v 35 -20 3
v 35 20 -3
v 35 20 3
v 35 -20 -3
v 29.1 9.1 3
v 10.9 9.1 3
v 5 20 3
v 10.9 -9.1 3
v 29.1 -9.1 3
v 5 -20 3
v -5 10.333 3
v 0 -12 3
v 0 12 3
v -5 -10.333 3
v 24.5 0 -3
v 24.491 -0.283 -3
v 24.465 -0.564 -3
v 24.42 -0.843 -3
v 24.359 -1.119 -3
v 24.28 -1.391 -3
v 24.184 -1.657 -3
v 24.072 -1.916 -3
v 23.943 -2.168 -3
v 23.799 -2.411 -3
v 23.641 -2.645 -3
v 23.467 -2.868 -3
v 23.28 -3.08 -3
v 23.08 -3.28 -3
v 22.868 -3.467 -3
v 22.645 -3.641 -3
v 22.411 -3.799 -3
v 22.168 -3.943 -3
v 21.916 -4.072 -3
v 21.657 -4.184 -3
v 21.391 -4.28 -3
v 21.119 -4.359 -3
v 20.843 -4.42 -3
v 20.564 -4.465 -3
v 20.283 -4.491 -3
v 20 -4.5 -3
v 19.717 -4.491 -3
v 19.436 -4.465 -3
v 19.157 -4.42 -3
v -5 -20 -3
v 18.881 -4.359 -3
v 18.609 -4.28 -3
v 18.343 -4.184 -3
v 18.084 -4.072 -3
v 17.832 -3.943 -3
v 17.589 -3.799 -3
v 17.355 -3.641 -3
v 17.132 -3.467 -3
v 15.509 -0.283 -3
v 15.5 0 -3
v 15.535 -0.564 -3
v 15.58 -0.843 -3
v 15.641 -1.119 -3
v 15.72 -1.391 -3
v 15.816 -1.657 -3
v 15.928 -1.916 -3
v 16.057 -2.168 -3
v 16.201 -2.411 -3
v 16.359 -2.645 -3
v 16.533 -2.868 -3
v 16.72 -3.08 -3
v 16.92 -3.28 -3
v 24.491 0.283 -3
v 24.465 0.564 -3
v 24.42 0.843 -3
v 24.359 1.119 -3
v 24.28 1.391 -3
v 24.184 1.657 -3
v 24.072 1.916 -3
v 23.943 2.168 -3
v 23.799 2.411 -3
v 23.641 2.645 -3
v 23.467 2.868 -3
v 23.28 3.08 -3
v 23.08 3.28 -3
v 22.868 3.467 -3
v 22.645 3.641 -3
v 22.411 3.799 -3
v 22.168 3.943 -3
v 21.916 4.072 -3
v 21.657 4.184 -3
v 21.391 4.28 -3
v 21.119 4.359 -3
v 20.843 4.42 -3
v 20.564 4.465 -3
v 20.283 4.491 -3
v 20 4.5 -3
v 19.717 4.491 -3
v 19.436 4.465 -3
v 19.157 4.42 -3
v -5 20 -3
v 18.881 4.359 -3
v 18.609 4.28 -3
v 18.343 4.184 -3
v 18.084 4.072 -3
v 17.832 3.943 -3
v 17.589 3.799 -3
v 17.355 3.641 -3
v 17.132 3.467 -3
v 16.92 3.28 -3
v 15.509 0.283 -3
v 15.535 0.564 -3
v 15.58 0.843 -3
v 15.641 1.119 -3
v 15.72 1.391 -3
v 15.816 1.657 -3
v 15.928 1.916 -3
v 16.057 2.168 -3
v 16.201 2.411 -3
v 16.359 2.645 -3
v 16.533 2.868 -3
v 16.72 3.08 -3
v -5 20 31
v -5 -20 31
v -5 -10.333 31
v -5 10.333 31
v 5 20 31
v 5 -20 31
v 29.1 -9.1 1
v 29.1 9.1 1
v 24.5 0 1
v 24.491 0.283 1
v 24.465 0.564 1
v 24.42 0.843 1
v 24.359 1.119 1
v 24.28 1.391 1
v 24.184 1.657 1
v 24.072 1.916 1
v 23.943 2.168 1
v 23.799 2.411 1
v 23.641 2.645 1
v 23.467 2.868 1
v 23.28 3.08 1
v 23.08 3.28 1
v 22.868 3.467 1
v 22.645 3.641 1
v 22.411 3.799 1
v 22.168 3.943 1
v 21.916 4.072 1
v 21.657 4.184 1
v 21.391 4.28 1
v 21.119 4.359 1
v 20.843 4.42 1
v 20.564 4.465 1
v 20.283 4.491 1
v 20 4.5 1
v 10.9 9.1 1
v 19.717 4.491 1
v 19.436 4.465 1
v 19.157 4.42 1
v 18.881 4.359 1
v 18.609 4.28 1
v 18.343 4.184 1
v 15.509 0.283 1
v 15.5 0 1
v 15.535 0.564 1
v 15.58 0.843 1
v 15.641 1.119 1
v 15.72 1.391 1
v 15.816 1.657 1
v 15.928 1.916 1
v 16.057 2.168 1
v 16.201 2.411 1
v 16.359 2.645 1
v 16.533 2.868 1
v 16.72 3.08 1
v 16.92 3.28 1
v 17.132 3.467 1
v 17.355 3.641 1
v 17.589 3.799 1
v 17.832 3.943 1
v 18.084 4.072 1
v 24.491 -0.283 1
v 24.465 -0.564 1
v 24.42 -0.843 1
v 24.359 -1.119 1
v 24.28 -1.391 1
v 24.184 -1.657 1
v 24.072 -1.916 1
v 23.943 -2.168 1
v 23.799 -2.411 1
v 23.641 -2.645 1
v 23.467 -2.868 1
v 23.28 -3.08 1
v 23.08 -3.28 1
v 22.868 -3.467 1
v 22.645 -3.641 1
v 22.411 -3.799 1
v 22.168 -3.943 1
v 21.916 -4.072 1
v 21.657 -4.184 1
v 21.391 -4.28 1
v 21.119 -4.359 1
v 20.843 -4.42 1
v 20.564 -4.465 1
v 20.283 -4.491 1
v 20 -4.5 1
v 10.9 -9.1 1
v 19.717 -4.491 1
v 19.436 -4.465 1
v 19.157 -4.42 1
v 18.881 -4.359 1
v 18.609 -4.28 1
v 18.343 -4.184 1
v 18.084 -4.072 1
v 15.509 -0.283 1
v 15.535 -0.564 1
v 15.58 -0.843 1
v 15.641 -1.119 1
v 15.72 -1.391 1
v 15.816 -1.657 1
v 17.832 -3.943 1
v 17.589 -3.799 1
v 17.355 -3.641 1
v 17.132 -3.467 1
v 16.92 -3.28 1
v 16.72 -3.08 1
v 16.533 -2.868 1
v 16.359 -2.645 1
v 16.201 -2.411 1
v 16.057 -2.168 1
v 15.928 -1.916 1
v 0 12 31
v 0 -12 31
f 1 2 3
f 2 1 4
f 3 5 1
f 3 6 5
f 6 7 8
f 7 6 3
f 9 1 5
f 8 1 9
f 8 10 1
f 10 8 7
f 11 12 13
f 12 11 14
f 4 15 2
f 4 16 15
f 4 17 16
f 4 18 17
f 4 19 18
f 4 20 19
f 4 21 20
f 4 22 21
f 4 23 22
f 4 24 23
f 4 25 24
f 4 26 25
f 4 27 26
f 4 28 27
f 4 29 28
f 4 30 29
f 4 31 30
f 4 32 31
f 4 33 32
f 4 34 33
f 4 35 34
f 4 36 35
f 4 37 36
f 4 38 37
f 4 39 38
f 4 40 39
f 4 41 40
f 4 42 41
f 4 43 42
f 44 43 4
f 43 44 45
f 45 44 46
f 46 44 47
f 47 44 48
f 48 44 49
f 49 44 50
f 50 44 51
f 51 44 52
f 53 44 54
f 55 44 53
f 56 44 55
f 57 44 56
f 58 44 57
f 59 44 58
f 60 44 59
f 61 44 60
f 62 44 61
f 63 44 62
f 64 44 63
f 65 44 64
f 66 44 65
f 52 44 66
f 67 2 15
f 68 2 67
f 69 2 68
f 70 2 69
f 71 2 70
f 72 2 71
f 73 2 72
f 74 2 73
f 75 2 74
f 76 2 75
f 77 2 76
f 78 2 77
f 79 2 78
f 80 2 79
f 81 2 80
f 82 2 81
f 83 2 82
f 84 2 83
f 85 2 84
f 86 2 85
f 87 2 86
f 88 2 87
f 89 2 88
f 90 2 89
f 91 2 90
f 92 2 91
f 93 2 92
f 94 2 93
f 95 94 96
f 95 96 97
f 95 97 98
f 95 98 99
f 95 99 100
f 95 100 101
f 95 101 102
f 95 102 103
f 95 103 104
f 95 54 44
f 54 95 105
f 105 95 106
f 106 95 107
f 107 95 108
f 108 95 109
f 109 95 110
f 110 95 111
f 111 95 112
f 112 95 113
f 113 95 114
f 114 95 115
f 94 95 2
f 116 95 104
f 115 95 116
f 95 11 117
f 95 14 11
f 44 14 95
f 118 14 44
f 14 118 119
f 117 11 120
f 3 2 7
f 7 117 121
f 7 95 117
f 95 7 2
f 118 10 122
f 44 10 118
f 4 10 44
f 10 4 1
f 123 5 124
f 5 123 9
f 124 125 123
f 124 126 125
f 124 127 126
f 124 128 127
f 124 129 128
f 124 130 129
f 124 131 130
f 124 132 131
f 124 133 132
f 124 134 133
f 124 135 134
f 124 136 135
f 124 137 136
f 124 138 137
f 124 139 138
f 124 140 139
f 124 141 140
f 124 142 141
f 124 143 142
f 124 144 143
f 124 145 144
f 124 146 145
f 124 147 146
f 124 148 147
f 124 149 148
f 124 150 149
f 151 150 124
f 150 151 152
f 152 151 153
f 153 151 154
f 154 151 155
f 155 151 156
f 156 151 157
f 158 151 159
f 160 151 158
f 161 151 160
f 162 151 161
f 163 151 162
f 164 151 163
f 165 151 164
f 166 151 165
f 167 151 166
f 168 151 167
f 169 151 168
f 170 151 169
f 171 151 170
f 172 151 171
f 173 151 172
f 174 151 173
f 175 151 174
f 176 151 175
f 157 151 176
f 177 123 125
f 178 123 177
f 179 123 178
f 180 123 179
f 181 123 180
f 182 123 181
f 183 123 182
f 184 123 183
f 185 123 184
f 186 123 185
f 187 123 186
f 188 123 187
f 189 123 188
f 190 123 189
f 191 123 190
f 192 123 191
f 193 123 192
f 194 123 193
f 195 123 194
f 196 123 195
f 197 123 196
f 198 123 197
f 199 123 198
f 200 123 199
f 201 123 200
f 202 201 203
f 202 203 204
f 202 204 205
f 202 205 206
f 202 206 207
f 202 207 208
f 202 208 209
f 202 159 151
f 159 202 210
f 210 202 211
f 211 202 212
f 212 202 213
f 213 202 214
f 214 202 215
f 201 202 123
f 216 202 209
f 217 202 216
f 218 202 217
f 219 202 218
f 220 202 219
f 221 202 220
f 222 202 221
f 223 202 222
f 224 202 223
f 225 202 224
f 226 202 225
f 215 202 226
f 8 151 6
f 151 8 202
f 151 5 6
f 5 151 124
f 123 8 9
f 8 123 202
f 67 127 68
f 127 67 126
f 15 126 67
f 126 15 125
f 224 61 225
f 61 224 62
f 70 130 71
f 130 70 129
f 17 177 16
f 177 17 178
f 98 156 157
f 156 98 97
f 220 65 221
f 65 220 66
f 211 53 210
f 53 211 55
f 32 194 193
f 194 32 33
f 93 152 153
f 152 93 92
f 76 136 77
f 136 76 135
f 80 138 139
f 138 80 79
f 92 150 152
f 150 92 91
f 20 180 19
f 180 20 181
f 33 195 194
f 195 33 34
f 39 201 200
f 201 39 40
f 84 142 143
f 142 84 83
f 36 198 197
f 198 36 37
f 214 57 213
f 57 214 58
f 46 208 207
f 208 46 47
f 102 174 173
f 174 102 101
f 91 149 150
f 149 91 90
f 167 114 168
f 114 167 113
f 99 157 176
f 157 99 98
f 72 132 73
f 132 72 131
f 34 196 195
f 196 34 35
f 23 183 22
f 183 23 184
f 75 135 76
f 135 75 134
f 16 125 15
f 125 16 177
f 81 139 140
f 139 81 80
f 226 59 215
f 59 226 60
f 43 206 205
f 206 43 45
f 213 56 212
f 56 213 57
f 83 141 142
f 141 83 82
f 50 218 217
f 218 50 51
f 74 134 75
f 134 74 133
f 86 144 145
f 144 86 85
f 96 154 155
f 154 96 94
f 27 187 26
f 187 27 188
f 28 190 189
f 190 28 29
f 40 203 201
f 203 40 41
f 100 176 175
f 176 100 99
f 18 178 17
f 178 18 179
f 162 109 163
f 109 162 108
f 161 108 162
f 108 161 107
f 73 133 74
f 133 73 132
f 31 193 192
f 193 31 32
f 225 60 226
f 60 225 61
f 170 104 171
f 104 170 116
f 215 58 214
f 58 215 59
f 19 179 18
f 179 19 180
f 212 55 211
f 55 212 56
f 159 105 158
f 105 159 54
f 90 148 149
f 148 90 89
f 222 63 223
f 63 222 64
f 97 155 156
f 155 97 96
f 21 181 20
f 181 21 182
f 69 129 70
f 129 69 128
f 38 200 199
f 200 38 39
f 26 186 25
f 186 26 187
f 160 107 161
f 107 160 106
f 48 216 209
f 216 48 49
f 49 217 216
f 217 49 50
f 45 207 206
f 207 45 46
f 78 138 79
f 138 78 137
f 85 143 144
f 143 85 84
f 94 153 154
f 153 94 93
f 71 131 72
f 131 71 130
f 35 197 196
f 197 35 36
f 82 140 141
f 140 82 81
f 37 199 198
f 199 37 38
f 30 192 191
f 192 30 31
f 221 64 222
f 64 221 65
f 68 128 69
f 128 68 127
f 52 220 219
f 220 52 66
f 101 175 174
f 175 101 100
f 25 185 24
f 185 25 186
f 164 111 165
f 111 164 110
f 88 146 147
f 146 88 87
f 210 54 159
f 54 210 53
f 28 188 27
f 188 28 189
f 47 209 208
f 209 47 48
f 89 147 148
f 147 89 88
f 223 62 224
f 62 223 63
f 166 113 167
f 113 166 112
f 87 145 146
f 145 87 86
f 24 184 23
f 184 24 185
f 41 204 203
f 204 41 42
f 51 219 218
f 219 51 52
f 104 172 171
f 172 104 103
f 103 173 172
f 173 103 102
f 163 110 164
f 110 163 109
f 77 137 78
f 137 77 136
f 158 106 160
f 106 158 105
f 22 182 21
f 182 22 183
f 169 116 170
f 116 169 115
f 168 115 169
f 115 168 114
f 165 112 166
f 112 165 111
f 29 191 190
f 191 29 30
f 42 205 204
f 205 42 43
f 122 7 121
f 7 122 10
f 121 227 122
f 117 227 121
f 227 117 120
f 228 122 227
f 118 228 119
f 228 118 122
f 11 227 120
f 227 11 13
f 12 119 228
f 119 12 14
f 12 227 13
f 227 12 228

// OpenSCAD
$fn = 100;

module pen_holder() {
	difference() {
		translate([15, 0, 0]) cube( size = [40, 40, 6], center = true);
		translate([20, 0, 3]) cube( size = [18.2, 18.2, 4], center = true);
		translate([20, 0, 0]) cylinder(h=8, r=4.5, center = true);
	}
	translate([0, 0, 3]) {
		difference() {
			translate([0, 0, 14]) cube([10, 40, 28], center=true);
			rotate([0, 0, 90]) linear_extrude(28) polygon(points=[[-12,0],[12,0],[10,6],[-10,6]]);
		}
	}
}

pen_holder();

// vim: ts=2:sw=2:noet:commentstring=//\ %s
